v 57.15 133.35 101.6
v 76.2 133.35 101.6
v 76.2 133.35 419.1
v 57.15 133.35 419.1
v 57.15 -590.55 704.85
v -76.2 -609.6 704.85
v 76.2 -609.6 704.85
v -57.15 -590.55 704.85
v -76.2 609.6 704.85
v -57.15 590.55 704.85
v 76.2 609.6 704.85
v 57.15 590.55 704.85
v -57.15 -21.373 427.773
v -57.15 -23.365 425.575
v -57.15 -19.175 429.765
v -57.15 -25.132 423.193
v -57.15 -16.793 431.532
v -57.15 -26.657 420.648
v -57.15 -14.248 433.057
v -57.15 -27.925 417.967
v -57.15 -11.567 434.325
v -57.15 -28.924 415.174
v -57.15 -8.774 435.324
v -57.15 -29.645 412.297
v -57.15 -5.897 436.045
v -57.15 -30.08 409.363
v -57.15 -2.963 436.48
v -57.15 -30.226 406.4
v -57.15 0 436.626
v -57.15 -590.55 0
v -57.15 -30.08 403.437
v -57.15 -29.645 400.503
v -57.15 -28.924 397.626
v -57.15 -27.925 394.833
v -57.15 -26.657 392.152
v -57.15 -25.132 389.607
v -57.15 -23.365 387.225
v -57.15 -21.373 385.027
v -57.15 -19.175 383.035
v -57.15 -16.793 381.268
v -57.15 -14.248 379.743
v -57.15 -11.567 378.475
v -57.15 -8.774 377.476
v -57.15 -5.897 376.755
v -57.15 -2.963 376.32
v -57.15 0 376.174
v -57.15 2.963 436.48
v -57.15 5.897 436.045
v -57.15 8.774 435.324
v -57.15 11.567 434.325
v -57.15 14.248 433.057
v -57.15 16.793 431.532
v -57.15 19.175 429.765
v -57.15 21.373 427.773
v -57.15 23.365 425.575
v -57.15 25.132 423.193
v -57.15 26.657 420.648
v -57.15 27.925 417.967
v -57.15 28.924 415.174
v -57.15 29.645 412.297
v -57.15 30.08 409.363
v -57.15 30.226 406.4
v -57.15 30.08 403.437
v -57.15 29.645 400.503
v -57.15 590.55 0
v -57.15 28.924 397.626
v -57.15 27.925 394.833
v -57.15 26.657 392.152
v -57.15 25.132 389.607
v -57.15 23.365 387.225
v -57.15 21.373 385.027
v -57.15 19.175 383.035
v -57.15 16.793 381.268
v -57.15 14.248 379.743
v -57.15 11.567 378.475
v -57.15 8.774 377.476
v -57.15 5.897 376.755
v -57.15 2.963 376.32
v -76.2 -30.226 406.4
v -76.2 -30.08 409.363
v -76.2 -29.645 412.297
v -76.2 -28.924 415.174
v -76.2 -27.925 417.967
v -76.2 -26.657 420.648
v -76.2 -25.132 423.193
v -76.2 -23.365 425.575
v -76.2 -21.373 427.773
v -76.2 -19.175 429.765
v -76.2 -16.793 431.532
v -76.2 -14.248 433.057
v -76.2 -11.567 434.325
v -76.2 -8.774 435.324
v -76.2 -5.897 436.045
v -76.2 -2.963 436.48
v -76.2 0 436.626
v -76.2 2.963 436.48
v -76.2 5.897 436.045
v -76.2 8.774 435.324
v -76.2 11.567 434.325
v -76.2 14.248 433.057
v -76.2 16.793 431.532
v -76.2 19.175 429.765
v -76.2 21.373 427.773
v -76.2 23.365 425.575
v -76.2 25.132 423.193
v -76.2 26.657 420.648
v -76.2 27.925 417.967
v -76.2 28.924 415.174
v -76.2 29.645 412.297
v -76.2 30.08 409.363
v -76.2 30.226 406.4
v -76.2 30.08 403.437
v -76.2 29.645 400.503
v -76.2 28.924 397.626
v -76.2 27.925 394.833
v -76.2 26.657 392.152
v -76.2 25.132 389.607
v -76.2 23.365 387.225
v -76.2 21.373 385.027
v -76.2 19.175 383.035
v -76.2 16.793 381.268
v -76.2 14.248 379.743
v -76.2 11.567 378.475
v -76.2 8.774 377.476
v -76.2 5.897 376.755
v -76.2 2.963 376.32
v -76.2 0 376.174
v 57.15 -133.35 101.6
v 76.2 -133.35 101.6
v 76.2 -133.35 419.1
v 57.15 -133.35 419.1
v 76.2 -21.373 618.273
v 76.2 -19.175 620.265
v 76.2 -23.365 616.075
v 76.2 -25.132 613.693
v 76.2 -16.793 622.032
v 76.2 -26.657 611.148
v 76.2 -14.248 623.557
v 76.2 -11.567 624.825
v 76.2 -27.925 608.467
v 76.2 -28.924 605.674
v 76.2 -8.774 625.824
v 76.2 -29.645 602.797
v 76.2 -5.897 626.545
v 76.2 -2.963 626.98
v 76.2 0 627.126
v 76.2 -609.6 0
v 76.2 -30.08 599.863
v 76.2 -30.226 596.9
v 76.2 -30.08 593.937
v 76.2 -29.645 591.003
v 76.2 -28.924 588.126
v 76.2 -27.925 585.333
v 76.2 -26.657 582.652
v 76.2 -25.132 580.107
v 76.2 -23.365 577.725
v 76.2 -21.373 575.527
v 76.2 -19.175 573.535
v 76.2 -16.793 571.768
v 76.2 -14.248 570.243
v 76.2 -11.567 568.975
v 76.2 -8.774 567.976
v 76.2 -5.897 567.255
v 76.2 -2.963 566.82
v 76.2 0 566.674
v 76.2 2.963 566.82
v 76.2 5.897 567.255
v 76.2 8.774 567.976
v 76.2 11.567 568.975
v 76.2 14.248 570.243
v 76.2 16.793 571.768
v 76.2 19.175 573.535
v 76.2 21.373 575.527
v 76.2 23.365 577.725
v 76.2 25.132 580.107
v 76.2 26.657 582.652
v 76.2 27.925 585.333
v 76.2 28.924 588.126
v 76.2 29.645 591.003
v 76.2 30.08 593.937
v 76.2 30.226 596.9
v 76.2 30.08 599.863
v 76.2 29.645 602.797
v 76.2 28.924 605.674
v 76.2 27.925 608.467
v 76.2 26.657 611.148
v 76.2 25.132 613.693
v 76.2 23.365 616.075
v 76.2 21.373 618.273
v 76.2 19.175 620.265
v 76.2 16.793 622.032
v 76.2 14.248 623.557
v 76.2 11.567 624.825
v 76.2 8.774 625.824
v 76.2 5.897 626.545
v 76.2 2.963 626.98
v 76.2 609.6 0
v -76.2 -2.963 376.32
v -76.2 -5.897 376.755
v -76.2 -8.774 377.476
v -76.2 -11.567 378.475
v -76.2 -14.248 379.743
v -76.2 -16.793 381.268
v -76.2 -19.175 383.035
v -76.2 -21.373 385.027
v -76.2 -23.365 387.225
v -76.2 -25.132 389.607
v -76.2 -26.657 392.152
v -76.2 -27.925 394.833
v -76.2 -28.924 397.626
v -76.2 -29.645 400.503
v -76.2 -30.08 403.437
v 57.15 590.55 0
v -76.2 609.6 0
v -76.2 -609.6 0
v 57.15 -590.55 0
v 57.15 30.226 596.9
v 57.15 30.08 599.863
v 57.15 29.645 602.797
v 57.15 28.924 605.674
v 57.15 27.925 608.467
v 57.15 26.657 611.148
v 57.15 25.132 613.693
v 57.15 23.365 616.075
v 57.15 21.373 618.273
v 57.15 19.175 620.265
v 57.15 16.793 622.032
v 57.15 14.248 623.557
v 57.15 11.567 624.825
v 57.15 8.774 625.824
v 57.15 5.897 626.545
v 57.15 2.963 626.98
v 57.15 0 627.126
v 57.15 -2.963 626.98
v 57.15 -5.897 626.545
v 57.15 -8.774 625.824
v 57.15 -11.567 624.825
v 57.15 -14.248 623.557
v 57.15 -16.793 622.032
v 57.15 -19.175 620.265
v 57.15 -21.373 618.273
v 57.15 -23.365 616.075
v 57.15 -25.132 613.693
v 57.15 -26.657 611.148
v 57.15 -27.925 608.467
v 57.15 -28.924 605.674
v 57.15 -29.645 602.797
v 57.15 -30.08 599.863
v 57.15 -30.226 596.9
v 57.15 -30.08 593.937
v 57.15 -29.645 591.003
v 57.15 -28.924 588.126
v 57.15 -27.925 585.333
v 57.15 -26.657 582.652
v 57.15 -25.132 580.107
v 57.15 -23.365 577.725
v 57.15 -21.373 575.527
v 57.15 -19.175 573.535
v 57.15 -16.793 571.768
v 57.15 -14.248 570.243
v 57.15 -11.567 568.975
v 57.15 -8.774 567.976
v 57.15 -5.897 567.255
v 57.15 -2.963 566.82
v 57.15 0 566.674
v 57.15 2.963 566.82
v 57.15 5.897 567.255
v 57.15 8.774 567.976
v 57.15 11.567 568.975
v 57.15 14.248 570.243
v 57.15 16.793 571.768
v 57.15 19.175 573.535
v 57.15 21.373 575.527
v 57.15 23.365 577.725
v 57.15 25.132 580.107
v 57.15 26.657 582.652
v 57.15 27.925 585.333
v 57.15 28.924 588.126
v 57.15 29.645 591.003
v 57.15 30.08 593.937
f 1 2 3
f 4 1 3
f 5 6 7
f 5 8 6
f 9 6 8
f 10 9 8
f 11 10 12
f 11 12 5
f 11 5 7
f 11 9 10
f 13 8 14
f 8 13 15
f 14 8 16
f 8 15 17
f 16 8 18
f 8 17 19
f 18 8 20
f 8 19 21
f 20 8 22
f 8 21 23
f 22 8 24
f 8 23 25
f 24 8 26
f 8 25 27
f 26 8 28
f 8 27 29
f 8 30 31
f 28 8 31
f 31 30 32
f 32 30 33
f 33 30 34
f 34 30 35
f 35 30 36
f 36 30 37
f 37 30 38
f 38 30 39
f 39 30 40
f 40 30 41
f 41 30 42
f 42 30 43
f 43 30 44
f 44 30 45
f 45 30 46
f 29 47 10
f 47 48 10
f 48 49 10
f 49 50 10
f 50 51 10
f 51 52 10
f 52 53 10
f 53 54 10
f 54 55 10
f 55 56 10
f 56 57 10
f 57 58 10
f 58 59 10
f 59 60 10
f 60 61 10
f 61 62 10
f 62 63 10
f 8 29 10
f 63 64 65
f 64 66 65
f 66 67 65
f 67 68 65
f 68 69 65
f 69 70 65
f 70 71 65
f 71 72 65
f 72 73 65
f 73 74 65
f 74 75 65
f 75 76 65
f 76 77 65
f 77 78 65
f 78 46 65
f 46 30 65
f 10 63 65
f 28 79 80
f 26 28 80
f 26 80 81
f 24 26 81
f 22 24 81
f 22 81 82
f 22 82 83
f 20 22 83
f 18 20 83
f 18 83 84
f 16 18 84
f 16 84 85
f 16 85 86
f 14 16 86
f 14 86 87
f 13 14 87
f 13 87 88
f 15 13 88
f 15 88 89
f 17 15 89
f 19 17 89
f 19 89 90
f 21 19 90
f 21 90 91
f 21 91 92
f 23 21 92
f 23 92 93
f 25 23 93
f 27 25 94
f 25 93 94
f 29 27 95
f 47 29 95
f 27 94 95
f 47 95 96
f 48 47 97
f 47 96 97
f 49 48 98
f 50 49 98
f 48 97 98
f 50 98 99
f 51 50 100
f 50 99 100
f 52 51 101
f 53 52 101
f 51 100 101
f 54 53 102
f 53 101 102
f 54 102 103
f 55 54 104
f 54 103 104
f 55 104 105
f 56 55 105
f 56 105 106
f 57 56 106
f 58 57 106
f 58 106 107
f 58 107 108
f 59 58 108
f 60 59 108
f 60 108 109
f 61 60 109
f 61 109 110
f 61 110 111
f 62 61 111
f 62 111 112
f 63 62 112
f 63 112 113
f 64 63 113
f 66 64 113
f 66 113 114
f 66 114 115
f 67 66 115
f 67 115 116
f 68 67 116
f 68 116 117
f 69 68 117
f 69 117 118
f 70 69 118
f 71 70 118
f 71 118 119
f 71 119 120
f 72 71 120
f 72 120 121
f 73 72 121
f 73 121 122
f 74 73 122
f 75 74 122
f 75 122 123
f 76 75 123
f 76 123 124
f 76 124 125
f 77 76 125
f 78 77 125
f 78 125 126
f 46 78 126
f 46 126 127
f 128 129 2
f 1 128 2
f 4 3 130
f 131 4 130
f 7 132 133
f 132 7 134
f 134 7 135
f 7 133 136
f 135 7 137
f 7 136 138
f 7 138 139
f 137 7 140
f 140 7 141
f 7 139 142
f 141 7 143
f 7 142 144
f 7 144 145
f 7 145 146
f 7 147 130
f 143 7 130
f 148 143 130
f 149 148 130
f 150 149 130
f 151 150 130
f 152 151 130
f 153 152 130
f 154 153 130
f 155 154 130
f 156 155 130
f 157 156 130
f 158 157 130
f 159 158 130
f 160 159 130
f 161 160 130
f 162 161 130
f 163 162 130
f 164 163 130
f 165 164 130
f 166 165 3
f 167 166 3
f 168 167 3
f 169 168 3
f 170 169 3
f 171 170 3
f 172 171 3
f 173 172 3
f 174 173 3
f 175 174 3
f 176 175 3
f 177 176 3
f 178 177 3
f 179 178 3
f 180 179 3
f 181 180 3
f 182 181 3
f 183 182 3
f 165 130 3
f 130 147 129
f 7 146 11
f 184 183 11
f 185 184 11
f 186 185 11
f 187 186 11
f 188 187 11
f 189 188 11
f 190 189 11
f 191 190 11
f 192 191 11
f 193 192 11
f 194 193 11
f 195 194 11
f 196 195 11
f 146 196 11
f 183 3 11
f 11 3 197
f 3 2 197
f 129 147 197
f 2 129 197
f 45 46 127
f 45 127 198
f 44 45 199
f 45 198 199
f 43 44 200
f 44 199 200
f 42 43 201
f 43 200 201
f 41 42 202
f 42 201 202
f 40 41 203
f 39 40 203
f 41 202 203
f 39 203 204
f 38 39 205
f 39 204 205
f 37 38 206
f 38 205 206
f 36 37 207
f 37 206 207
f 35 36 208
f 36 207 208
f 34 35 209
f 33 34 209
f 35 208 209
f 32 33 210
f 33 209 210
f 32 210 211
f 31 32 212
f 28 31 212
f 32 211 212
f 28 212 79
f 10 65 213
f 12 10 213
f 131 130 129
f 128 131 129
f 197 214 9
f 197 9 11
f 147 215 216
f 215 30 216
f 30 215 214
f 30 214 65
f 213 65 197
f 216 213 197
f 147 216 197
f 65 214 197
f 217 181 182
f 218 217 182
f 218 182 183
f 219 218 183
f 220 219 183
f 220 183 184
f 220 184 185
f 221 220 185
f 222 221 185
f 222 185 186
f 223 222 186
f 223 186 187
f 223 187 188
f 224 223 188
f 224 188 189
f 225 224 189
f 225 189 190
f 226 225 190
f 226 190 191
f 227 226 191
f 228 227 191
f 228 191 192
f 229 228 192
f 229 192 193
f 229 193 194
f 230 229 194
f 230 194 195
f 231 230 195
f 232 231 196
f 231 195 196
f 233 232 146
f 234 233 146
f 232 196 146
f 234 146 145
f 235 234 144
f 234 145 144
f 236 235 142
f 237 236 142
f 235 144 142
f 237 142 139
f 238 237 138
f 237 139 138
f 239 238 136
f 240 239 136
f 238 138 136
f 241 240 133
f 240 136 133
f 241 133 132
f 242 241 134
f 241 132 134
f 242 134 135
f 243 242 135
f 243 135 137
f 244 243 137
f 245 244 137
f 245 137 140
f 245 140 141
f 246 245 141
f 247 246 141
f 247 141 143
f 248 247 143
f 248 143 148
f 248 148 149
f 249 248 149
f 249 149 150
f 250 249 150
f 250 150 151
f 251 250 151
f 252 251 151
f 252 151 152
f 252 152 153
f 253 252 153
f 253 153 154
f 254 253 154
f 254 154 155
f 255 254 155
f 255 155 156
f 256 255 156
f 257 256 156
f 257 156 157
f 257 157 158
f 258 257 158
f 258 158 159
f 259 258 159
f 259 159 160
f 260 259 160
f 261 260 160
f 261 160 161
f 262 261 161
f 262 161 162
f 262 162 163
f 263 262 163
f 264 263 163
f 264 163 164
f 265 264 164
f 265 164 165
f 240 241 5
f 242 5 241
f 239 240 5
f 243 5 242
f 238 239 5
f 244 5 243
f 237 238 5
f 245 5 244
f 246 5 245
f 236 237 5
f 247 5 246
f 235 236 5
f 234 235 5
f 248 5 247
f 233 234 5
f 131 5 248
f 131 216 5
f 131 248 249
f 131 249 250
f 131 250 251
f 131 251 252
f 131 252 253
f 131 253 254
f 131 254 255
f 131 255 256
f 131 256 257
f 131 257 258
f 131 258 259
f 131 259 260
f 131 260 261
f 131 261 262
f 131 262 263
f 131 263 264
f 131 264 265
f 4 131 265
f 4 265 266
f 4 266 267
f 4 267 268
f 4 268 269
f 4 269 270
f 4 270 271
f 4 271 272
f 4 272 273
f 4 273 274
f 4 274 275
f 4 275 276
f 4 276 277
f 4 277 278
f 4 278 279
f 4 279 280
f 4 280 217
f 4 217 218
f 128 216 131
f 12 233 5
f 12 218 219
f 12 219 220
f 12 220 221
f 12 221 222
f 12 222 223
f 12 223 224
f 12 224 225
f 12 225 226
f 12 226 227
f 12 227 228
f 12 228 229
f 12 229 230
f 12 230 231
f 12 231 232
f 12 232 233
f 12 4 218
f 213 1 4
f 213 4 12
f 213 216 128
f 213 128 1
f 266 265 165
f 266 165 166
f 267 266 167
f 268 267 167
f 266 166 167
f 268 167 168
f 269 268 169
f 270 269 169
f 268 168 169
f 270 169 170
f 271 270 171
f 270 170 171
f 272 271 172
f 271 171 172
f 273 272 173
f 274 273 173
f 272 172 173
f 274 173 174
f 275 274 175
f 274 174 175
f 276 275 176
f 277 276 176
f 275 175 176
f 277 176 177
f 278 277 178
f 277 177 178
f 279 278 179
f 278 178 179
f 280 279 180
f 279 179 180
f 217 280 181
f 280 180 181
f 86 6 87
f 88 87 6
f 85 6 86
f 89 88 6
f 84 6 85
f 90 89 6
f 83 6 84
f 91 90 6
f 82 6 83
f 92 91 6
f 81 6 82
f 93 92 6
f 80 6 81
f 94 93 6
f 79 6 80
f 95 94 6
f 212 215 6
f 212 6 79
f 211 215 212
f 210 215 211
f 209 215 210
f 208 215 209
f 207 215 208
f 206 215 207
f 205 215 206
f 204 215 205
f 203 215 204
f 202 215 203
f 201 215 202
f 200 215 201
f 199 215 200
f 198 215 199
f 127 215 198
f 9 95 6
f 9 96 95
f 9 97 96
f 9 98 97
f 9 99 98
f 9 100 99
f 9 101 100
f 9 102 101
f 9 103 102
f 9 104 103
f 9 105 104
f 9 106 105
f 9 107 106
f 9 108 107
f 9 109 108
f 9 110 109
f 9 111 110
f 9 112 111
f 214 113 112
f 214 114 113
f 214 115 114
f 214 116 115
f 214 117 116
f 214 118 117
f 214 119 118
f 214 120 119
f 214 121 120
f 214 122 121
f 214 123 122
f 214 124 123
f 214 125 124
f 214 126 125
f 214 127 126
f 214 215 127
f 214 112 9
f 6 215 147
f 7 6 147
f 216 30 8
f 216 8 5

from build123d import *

# Parameters (mm, degrees)
F0_W     = 152.4
F0_H     = 1219.2
F0_W_2   = 114.3
F0_H_2   = 1181.1
F1_DEPTH = 704.85
F3_DEPTH = 25.4
F5_DEPTH = 25.4


# Not quite as in the source:
# - a feature names something its author has since deleted; it is built from what else it names


with BuildPart() as f1:
    # F0 (on Top) → F1 (new body)
    with BuildSketch(Plane.XY):
        Rectangle(F0_W, F0_H)
        Rectangle(F0_W_2, F0_H_2, mode=Mode.SUBTRACT)
    extrude(amount=F1_DEPTH)

    # F2 (on face) → F3 (cut)
    with BuildSketch(Plane.YZ.offset(76.2)):
        with BuildLine():
            ThreePointArc((30.226, 596.9), (-21.3730095681, 618.2730095681), (0, 566.674))
            ThreePointArc((0, 566.674), (21.3730095681, 575.5269904319), (30.226, 596.9))
        make_face()
        Polygon((-133.35, 101.6), (0, 101.6), (133.35, 101.6), (133.35, 419.1), (0, 419.1), (-133.35, 419.1), align=None)
    extrude(amount=-F3_DEPTH, mode=Mode.SUBTRACT)

    # F4 (on face) → F5 (cut)
    with BuildSketch(Plane(origin=(-76.2, 0, 0), x_dir=(0, -1, 0), z_dir=(-1, 0, 0))):
        with BuildLine():
            ThreePointArc((30.226, 406.4), (-21.3730095681, 427.7730095681), (0, 376.174))
            ThreePointArc((0, 376.174), (21.3730095681, 385.0269904319), (30.226, 406.4))
        make_face()
    extrude(amount=-F5_DEPTH, mode=Mode.SUBTRACT)


solid = f1.part
